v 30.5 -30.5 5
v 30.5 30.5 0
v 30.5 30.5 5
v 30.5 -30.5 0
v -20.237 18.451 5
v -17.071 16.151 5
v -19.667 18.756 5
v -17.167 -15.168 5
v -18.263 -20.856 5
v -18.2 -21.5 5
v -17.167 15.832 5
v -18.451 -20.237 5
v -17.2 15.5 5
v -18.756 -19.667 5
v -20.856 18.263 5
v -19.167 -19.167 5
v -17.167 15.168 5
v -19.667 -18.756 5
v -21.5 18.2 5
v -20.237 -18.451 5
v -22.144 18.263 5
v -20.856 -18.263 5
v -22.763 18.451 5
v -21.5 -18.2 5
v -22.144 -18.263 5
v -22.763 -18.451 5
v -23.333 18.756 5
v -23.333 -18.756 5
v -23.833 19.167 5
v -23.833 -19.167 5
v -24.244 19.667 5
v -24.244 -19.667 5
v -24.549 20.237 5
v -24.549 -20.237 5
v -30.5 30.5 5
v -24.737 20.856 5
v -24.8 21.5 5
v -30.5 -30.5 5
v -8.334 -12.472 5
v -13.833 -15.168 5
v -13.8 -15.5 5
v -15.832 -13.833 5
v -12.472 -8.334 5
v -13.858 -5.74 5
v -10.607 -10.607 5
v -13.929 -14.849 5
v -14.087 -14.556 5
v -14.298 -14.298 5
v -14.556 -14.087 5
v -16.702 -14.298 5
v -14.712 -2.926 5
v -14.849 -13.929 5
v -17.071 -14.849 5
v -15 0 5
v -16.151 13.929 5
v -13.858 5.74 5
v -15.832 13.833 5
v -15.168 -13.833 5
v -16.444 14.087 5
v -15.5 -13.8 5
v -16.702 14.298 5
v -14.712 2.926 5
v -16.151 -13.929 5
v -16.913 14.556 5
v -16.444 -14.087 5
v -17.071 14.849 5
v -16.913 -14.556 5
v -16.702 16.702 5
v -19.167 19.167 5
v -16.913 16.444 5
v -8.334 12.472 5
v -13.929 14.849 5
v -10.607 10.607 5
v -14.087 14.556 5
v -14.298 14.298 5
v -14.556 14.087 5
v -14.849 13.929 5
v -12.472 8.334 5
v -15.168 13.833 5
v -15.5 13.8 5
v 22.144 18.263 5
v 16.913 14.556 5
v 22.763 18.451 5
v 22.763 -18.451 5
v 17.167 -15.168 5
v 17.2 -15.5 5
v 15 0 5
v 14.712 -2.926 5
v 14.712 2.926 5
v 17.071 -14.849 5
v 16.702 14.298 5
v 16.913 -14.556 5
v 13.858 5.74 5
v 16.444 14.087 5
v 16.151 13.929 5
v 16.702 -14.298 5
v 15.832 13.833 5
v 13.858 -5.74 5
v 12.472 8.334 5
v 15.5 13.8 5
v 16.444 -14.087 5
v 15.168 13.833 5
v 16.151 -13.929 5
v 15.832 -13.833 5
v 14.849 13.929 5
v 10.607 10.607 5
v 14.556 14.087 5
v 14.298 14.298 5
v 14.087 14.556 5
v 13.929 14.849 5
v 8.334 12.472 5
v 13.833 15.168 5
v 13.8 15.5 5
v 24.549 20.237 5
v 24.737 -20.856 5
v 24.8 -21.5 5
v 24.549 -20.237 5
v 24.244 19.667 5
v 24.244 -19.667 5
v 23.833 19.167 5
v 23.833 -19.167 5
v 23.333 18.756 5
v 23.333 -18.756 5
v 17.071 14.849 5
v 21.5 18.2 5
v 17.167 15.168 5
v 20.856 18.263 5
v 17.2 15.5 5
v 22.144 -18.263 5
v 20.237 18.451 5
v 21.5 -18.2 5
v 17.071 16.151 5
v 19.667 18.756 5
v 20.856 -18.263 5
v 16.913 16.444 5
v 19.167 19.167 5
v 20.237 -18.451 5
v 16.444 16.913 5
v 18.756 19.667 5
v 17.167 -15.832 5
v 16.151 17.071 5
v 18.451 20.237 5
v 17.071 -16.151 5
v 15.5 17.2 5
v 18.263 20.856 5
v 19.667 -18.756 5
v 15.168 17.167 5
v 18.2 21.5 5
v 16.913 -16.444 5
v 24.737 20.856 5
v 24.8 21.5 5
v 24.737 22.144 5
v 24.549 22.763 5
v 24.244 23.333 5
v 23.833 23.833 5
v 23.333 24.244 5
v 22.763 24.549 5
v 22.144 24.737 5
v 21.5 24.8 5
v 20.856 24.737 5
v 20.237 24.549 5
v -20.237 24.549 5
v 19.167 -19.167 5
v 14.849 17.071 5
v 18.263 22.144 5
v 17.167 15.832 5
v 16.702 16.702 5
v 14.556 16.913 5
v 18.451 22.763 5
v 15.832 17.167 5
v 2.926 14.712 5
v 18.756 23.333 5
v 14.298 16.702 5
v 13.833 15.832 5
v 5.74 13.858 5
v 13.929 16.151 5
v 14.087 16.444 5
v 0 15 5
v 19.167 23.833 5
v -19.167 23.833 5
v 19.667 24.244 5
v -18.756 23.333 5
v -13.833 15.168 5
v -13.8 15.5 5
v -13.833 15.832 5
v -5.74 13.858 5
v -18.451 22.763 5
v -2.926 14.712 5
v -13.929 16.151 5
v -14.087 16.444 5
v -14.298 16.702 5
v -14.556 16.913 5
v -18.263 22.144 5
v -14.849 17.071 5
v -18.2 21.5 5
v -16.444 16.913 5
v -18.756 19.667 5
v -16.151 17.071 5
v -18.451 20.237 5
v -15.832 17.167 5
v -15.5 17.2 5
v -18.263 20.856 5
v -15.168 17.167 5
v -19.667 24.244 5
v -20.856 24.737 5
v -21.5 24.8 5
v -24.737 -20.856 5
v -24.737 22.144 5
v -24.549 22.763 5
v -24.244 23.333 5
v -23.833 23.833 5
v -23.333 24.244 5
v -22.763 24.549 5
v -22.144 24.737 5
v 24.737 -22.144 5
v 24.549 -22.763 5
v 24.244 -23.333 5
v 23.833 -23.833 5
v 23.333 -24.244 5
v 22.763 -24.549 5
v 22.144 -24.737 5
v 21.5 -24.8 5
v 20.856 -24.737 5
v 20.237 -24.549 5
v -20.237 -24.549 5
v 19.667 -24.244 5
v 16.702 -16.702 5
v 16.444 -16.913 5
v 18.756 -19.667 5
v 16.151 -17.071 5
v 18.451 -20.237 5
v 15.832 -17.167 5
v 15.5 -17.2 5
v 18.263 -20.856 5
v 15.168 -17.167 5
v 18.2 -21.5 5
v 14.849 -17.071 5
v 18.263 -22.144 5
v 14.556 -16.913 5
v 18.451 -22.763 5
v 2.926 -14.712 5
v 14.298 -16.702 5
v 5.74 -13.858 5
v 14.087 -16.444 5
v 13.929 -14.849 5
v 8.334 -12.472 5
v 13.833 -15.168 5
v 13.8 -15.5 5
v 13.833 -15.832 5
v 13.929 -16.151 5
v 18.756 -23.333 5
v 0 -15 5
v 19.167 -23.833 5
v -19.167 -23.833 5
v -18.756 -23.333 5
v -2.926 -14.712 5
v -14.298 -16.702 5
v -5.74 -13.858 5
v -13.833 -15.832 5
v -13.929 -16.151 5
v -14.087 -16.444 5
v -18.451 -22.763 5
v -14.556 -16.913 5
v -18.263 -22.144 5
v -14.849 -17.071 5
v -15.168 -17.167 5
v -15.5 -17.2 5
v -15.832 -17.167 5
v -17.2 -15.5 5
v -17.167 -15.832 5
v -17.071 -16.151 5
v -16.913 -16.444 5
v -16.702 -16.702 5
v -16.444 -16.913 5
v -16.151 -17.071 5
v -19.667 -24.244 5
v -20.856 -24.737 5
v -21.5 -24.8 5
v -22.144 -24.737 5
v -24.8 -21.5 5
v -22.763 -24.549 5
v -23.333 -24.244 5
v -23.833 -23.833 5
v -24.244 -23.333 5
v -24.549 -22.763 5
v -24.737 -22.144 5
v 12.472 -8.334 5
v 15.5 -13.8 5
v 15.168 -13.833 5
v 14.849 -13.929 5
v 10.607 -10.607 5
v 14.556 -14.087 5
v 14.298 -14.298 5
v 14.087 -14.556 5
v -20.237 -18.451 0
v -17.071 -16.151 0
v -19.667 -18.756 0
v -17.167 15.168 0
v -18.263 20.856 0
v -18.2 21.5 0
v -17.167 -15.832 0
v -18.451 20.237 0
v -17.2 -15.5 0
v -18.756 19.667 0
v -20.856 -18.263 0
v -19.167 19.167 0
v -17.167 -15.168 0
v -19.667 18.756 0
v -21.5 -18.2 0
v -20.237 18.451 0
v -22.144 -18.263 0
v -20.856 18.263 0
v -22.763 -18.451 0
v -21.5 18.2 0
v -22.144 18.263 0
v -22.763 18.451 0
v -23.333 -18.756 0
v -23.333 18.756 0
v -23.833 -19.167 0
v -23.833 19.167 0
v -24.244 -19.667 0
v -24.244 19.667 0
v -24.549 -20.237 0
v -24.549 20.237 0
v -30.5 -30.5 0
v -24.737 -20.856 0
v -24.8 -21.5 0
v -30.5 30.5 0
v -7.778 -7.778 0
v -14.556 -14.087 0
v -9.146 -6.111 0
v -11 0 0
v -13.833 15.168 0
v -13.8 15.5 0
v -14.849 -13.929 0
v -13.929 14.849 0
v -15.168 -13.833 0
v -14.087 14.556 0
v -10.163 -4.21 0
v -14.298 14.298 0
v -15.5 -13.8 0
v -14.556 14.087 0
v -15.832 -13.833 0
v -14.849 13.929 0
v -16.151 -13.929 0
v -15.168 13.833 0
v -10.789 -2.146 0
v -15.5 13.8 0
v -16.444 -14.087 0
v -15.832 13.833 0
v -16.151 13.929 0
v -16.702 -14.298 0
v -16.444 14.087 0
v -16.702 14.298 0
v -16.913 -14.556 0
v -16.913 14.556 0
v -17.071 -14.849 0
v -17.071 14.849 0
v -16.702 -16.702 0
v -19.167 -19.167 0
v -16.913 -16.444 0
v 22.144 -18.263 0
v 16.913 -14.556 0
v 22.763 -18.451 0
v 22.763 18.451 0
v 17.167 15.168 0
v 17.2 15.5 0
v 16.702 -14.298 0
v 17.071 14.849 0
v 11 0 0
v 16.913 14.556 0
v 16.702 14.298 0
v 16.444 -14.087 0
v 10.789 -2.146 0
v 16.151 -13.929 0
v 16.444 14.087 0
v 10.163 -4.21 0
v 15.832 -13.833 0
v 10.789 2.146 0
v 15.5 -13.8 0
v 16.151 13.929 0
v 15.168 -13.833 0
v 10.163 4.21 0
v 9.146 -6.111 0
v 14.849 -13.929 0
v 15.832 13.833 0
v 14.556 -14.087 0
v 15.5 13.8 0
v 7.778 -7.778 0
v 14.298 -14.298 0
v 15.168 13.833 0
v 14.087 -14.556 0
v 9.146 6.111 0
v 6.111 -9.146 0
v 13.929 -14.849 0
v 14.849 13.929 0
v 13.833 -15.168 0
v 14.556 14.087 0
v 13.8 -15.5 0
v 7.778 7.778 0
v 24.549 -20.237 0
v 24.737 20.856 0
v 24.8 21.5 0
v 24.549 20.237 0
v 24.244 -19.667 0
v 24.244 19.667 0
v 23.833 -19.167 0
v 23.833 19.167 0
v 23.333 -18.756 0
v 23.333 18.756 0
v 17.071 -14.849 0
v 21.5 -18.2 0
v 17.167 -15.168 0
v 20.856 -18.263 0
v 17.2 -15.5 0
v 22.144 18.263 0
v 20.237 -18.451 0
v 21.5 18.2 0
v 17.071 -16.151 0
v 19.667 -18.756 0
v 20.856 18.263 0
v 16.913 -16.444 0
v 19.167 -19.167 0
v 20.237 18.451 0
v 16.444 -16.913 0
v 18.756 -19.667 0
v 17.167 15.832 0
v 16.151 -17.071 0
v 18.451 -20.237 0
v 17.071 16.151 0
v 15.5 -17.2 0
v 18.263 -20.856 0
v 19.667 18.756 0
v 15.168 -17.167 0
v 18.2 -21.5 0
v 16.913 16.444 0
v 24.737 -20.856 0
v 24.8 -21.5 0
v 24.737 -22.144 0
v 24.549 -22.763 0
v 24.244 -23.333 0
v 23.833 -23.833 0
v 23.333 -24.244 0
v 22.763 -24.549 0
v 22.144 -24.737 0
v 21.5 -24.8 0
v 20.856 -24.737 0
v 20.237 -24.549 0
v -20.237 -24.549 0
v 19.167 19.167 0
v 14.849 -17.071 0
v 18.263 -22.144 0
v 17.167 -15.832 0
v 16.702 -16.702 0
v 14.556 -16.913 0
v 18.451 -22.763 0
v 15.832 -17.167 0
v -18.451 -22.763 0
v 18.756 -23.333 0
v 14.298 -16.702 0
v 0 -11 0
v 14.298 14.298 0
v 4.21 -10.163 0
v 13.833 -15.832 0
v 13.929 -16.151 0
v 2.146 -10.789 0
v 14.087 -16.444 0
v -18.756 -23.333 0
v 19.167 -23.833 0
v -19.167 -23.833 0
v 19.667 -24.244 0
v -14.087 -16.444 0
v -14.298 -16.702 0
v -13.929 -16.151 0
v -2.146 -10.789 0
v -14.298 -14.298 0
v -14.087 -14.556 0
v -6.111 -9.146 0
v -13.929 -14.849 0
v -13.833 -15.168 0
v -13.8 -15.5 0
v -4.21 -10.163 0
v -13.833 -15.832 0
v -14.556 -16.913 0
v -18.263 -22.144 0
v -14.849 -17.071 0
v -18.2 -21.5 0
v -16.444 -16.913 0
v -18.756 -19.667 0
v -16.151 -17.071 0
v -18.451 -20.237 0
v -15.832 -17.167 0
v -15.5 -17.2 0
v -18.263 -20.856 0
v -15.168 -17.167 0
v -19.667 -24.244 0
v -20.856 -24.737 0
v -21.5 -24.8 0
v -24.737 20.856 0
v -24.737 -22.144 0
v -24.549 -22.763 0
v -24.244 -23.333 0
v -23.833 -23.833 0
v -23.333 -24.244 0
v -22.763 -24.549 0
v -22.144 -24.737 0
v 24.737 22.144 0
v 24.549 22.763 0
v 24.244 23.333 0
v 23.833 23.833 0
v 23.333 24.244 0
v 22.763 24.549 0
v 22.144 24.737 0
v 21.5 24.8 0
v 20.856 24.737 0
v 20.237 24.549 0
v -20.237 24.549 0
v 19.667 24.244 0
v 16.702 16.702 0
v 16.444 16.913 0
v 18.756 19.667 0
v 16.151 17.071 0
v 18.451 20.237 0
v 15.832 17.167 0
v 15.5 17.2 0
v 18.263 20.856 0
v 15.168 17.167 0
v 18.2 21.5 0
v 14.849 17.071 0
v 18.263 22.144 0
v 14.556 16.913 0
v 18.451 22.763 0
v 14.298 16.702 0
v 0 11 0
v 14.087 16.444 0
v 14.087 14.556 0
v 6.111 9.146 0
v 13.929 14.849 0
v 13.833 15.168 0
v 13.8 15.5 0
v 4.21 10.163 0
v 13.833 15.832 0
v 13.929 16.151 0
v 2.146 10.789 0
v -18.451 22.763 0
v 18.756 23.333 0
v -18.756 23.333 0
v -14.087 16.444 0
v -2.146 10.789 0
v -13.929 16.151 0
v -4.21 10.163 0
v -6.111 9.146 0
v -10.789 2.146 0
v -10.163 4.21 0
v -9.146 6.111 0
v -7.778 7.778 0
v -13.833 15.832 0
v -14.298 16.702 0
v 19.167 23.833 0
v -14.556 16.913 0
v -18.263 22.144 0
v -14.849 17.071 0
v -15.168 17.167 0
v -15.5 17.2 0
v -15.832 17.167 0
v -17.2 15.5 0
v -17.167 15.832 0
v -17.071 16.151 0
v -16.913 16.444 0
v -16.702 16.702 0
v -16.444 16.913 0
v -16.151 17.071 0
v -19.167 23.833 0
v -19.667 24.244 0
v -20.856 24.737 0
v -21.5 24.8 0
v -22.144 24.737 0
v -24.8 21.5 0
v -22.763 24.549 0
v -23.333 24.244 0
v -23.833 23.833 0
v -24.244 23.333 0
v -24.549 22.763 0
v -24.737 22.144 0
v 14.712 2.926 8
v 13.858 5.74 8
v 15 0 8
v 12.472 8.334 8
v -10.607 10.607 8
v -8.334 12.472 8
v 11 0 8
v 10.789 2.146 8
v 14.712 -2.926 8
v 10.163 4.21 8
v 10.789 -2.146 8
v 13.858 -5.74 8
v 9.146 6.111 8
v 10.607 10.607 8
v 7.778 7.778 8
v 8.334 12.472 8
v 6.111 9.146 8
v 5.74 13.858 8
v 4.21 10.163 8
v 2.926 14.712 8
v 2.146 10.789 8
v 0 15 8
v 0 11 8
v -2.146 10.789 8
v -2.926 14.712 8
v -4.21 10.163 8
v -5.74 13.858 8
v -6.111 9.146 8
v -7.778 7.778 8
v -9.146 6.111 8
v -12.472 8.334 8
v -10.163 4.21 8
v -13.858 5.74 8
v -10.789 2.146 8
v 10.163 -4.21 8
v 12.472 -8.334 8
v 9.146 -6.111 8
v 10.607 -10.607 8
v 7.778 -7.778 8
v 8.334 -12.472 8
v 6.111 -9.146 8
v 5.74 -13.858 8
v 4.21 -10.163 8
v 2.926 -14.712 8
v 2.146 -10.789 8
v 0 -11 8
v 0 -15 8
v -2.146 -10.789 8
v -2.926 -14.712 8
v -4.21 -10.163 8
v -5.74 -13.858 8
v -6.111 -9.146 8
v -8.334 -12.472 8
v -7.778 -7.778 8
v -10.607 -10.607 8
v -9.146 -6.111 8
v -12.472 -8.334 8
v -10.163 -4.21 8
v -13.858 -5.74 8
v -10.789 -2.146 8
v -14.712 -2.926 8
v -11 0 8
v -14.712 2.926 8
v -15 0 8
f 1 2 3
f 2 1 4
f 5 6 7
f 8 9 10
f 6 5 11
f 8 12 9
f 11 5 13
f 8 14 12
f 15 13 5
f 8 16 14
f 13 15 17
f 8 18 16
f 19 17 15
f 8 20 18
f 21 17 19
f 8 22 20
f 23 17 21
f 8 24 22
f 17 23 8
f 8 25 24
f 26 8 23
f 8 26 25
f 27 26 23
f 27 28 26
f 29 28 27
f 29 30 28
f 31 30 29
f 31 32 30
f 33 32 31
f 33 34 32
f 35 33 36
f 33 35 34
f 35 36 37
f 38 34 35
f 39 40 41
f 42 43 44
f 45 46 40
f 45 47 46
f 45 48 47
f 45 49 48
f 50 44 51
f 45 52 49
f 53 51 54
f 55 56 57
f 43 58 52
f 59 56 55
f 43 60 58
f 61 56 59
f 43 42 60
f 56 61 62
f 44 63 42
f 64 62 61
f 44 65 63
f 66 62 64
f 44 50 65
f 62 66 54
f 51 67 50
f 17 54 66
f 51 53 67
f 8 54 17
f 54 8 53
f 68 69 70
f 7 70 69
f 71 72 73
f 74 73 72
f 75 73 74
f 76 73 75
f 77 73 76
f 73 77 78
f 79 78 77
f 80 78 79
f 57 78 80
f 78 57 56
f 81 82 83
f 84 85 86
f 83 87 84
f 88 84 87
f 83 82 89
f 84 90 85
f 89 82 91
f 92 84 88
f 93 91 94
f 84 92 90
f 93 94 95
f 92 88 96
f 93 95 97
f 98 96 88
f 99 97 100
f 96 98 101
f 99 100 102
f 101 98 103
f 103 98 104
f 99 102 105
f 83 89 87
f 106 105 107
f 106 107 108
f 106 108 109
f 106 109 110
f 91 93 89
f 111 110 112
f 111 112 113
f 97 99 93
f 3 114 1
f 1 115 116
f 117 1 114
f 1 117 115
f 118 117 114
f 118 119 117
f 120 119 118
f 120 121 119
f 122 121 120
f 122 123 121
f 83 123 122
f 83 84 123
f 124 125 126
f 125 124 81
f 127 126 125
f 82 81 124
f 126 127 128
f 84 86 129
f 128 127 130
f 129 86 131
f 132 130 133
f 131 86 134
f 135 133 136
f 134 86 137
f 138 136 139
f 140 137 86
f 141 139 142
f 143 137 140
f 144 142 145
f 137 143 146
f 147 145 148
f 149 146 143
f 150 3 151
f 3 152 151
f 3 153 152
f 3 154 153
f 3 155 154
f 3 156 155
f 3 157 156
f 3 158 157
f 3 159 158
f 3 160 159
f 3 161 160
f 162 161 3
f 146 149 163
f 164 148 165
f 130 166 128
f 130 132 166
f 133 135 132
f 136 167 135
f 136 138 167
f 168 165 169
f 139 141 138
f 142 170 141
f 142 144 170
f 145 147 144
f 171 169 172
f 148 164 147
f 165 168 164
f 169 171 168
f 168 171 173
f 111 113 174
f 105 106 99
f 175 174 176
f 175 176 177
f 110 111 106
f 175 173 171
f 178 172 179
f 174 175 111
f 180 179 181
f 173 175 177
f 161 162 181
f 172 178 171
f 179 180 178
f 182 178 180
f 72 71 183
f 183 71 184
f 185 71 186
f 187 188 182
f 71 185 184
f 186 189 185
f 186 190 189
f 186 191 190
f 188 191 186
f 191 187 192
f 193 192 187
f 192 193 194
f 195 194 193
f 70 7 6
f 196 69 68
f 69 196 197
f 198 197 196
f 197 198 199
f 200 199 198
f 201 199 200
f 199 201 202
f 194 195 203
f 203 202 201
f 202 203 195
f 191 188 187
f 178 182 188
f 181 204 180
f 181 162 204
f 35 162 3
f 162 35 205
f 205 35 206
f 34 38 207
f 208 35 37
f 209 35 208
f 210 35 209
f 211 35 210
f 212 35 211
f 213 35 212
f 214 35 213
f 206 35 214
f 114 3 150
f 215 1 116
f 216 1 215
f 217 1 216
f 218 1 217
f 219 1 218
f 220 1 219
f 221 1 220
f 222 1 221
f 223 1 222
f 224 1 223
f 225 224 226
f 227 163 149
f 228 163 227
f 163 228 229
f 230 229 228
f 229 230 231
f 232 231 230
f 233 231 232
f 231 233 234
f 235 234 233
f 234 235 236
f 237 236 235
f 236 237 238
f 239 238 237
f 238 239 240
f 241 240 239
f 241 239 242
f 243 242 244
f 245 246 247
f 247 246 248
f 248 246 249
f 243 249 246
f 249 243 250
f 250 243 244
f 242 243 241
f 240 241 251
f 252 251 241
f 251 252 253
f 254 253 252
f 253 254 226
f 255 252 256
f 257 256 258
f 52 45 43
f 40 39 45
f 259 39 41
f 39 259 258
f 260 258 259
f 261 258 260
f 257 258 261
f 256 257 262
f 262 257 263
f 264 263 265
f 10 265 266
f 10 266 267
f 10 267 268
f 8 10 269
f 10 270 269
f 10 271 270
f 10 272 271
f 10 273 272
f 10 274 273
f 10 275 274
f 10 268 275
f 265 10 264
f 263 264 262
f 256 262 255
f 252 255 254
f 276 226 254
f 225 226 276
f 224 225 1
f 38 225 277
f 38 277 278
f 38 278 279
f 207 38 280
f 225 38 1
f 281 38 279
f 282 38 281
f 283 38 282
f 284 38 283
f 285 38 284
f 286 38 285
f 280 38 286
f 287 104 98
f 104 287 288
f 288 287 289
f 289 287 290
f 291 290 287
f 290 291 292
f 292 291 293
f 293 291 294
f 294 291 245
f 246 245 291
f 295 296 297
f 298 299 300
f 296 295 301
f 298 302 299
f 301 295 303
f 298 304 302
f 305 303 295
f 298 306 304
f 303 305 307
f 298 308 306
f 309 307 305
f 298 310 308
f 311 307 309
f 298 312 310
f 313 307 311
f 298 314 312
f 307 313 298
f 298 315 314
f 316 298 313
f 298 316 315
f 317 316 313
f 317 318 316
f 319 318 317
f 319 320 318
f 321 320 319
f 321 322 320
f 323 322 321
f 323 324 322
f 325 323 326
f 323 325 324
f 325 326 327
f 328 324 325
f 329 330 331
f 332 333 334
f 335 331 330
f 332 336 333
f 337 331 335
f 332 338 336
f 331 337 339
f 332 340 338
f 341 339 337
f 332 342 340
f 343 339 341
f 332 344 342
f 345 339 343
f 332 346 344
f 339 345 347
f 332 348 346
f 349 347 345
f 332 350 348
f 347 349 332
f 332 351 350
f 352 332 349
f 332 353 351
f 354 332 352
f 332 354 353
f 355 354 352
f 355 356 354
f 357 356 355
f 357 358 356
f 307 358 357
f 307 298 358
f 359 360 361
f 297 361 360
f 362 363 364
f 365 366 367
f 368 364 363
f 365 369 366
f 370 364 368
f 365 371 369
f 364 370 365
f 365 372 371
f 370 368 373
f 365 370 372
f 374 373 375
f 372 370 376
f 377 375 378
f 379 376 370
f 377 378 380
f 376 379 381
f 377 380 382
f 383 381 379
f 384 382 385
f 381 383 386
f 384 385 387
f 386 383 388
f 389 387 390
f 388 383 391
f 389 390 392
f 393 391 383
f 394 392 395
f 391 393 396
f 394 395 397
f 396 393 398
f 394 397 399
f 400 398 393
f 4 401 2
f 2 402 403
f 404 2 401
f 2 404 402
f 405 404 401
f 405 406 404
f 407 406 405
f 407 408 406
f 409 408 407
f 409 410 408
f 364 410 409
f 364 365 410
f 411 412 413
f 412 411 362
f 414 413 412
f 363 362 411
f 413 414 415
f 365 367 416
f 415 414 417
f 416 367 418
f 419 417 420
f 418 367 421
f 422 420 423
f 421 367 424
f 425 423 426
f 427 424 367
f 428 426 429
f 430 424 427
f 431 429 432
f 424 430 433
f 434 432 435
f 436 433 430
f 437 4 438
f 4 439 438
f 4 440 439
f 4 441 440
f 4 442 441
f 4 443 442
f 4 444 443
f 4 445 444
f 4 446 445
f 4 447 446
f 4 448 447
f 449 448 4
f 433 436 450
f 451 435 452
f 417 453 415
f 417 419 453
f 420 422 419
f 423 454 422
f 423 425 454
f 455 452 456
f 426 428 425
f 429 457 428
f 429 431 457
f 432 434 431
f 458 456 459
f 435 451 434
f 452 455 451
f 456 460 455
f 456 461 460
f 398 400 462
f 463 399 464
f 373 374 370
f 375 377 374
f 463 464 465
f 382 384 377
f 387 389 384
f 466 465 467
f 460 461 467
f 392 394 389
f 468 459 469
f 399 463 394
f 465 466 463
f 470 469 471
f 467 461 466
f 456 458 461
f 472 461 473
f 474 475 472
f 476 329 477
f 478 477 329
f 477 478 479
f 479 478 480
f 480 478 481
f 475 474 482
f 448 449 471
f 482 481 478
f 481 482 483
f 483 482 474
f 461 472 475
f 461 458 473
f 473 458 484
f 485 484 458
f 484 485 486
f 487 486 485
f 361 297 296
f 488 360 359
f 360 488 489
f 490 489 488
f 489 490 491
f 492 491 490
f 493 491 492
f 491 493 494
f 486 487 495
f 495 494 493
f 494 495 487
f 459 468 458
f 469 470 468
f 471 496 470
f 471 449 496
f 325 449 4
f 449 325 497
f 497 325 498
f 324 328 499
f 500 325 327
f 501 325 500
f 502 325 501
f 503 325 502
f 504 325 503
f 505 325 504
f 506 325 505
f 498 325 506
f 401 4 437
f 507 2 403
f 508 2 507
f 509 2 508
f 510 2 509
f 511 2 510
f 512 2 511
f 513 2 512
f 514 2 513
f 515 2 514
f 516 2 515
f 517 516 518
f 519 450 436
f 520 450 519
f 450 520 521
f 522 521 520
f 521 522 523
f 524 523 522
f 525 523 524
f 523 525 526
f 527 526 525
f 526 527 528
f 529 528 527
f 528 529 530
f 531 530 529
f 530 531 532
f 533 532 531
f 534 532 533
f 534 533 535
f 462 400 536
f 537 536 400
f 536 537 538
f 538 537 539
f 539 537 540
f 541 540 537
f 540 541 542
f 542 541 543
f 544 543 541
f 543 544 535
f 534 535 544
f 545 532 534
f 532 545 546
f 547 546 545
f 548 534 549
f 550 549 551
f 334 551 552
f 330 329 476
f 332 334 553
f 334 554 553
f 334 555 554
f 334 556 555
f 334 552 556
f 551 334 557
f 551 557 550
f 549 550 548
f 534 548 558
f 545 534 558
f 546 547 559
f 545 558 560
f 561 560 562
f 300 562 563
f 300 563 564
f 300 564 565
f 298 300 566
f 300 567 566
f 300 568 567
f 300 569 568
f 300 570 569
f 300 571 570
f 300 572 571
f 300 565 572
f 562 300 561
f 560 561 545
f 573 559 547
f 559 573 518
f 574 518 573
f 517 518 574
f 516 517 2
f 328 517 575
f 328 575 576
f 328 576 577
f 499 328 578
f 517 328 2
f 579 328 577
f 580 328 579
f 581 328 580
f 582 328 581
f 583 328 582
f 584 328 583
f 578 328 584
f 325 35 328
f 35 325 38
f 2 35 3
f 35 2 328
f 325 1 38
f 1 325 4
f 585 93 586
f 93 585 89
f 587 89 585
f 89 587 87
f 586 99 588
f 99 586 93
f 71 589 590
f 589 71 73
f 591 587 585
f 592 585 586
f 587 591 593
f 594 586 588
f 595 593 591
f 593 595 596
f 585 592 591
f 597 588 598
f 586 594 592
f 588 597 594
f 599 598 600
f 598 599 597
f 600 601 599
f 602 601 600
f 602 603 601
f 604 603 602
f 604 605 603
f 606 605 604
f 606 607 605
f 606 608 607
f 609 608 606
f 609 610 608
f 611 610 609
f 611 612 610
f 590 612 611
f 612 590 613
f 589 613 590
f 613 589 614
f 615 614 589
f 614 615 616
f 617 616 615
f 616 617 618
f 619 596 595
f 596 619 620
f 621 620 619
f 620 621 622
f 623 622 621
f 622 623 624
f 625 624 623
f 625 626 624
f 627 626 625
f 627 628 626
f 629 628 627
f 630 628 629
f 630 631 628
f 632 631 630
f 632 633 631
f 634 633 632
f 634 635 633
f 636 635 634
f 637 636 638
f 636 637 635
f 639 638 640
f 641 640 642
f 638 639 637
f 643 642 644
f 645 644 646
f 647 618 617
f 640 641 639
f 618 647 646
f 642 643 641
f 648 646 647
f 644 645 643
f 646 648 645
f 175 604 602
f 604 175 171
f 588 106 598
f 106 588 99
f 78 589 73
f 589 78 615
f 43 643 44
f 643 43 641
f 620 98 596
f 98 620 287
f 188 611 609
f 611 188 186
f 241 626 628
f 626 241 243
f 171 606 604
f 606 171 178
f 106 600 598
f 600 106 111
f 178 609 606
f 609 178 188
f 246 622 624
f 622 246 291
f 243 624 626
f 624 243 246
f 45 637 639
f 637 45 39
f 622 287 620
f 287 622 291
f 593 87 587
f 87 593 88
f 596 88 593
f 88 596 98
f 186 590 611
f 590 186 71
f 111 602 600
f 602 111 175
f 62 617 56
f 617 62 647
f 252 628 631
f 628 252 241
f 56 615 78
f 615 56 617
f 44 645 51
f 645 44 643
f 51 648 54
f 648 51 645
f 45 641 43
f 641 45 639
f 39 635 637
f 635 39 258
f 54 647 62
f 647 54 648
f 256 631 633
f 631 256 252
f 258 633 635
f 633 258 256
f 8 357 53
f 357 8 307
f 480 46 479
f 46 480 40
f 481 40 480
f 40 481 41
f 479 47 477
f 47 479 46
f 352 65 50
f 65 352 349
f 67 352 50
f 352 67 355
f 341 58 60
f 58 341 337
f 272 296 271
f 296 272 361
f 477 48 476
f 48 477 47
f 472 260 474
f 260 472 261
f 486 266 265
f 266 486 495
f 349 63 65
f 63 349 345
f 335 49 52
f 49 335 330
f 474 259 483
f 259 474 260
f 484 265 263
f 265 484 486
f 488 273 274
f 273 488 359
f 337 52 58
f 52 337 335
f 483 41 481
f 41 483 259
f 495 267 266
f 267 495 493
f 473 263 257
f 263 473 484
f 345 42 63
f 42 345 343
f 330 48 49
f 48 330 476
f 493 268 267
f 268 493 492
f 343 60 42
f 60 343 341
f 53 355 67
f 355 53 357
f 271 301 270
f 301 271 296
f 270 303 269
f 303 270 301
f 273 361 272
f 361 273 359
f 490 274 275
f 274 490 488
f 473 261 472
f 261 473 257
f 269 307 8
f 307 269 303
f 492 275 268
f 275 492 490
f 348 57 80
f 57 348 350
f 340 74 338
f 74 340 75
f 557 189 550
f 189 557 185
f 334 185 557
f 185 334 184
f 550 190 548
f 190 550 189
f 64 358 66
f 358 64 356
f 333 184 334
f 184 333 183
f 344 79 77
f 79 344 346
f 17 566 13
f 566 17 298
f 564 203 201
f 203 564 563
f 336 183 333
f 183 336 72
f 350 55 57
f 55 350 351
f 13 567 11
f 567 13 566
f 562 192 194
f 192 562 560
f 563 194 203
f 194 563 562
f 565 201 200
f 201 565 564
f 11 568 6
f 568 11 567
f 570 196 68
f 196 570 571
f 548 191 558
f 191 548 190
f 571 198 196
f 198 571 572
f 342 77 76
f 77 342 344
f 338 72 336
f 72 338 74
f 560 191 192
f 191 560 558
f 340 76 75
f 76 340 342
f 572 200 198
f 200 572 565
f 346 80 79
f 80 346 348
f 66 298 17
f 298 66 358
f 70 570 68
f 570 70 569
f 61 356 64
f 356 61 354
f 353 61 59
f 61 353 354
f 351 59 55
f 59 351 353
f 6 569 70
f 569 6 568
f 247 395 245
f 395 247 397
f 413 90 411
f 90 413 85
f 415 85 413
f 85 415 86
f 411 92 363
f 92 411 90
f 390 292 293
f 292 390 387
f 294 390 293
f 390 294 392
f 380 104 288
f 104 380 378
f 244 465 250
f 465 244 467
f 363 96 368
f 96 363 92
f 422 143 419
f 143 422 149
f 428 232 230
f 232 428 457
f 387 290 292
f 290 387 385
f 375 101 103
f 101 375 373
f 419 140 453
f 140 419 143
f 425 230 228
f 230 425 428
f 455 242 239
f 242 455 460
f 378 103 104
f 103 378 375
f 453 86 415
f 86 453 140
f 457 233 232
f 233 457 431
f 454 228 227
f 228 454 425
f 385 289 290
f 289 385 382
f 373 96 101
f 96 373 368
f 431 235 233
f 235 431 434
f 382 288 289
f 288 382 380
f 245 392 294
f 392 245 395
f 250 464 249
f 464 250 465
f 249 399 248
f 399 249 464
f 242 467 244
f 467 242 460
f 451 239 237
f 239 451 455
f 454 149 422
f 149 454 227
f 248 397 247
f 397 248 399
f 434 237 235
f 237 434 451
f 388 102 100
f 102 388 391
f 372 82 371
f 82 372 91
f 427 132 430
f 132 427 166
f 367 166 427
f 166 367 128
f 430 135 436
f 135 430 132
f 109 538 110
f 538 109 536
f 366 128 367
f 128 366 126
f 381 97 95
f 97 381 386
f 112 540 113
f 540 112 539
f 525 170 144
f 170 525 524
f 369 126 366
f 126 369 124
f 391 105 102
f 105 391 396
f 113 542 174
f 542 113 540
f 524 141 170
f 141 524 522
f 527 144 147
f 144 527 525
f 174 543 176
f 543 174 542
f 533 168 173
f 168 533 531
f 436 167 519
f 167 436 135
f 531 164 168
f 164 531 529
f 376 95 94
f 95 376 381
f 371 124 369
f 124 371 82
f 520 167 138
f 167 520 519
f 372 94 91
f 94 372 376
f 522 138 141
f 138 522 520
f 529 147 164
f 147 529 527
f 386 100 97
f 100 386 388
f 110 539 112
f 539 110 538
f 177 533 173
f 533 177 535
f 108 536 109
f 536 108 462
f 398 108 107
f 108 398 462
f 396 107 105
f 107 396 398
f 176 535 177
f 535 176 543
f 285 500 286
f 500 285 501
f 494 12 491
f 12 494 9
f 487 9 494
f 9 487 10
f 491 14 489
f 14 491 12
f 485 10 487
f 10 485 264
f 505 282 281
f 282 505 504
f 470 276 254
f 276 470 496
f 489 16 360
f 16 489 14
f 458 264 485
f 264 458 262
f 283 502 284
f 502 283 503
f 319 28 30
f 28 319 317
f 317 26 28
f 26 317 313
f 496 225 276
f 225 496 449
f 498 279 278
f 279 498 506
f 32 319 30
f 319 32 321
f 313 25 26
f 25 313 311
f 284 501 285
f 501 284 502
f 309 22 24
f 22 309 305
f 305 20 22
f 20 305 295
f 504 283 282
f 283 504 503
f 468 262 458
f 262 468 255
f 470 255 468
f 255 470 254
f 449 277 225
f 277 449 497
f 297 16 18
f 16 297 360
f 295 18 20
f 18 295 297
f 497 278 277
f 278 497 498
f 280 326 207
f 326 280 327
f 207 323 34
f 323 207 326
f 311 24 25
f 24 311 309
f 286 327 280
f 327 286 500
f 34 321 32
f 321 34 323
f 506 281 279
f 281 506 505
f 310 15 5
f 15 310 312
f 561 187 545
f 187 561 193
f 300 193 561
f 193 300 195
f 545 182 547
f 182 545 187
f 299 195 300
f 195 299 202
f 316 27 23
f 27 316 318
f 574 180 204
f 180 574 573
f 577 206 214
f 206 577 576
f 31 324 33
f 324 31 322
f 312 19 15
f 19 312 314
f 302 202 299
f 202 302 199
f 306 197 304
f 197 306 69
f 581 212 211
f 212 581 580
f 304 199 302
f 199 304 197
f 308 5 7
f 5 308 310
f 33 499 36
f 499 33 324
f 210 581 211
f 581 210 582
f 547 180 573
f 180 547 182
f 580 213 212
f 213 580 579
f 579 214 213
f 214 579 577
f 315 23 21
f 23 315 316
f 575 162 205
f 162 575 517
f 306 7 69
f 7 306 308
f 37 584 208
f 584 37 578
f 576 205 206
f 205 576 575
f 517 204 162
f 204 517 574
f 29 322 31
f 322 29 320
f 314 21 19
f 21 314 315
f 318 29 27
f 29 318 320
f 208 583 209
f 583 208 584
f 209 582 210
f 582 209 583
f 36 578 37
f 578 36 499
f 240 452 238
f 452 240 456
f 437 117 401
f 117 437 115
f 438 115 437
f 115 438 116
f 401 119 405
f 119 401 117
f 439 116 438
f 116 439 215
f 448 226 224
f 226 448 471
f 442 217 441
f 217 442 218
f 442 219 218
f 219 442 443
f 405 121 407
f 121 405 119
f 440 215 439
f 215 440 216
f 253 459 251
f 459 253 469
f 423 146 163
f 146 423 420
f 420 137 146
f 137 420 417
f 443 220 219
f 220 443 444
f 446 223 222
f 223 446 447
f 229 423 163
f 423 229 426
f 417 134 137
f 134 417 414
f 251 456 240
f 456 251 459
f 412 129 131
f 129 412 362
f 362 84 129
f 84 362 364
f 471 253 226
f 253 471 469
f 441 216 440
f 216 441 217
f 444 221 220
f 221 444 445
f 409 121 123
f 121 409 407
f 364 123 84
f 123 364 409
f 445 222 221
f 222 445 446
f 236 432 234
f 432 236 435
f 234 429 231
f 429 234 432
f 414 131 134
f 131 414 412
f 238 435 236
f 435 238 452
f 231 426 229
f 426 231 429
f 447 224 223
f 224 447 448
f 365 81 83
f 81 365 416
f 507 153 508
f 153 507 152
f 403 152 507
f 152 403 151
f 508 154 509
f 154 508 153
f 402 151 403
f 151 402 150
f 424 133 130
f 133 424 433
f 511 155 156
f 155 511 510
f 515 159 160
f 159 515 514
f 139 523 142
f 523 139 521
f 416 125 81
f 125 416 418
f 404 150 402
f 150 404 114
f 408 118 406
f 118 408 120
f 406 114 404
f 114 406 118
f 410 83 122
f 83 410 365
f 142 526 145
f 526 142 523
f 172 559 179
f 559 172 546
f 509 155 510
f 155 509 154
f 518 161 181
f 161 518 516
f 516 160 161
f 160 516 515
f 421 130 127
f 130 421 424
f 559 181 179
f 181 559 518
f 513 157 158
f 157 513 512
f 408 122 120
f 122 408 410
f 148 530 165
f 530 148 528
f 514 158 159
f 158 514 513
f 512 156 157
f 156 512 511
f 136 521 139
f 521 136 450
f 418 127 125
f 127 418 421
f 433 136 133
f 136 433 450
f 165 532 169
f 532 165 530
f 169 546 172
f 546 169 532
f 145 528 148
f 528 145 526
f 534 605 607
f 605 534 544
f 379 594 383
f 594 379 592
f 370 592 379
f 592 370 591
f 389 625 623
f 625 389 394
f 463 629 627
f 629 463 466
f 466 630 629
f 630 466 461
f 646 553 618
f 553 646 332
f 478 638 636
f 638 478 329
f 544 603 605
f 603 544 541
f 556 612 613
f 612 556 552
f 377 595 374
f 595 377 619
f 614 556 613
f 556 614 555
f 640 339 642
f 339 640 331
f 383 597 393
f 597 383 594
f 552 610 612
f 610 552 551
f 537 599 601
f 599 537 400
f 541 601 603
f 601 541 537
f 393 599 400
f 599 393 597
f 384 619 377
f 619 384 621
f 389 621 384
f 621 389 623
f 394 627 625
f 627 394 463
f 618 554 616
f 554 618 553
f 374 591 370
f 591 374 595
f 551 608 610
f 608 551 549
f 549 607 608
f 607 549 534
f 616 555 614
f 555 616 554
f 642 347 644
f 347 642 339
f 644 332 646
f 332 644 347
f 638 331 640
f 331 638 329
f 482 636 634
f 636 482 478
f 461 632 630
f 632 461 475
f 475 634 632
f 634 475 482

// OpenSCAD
$fn = 32;

// ----------------------------------------------------------------------
// Motor mount plate: NEMA17, 61 x 61 x 8 mm
// ----------------------------------------------------------------------

// --- parameters (mm) ---
mount_w = 61;             // plate length, X
mount_d = 61;             // plate width, Y
mat_t = 5;                // plate thickness
motor_pitch = 31;         // NEMA17 bolt spacing
motor_d = 3.4;            // NEMA17 screw clearance
center_bore = 22;         // pilot boss bore
boss_d = 30;              // raised pilot ring
boss_h = 3;               // raised pilot ring height
second_d = 6.6;           // second fastener hole

module plate() {
  translate([-mount_w / 2, -mount_d / 2, 0]) cube([mount_w, mount_d, mat_t]);
}

module motor_holes() {
  for (sx = [-1, 1]) for (sy = [-1, 1])
    translate([sx * motor_pitch / 2, sy * motor_pitch / 2, -1])
      cylinder(h = mat_t + 2, d = motor_d);
}
module pilot_ring() {
  translate([0, 0, mat_t - 1]) cylinder(h = boss_h + 1, d = boss_d);
}

difference() {
  union() {
    plate();
    pilot_ring();
  }
  motor_holes();
  translate([0, 0, -1]) cylinder(h = mat_t + boss_h + 2, d = center_bore);
  for (sx = [-1, 1]) for (sy = [-1, 1])
    translate([sx * 21.5, sy * 21.5, -1]) cylinder(h = mat_t + 2, d = second_d);
}
